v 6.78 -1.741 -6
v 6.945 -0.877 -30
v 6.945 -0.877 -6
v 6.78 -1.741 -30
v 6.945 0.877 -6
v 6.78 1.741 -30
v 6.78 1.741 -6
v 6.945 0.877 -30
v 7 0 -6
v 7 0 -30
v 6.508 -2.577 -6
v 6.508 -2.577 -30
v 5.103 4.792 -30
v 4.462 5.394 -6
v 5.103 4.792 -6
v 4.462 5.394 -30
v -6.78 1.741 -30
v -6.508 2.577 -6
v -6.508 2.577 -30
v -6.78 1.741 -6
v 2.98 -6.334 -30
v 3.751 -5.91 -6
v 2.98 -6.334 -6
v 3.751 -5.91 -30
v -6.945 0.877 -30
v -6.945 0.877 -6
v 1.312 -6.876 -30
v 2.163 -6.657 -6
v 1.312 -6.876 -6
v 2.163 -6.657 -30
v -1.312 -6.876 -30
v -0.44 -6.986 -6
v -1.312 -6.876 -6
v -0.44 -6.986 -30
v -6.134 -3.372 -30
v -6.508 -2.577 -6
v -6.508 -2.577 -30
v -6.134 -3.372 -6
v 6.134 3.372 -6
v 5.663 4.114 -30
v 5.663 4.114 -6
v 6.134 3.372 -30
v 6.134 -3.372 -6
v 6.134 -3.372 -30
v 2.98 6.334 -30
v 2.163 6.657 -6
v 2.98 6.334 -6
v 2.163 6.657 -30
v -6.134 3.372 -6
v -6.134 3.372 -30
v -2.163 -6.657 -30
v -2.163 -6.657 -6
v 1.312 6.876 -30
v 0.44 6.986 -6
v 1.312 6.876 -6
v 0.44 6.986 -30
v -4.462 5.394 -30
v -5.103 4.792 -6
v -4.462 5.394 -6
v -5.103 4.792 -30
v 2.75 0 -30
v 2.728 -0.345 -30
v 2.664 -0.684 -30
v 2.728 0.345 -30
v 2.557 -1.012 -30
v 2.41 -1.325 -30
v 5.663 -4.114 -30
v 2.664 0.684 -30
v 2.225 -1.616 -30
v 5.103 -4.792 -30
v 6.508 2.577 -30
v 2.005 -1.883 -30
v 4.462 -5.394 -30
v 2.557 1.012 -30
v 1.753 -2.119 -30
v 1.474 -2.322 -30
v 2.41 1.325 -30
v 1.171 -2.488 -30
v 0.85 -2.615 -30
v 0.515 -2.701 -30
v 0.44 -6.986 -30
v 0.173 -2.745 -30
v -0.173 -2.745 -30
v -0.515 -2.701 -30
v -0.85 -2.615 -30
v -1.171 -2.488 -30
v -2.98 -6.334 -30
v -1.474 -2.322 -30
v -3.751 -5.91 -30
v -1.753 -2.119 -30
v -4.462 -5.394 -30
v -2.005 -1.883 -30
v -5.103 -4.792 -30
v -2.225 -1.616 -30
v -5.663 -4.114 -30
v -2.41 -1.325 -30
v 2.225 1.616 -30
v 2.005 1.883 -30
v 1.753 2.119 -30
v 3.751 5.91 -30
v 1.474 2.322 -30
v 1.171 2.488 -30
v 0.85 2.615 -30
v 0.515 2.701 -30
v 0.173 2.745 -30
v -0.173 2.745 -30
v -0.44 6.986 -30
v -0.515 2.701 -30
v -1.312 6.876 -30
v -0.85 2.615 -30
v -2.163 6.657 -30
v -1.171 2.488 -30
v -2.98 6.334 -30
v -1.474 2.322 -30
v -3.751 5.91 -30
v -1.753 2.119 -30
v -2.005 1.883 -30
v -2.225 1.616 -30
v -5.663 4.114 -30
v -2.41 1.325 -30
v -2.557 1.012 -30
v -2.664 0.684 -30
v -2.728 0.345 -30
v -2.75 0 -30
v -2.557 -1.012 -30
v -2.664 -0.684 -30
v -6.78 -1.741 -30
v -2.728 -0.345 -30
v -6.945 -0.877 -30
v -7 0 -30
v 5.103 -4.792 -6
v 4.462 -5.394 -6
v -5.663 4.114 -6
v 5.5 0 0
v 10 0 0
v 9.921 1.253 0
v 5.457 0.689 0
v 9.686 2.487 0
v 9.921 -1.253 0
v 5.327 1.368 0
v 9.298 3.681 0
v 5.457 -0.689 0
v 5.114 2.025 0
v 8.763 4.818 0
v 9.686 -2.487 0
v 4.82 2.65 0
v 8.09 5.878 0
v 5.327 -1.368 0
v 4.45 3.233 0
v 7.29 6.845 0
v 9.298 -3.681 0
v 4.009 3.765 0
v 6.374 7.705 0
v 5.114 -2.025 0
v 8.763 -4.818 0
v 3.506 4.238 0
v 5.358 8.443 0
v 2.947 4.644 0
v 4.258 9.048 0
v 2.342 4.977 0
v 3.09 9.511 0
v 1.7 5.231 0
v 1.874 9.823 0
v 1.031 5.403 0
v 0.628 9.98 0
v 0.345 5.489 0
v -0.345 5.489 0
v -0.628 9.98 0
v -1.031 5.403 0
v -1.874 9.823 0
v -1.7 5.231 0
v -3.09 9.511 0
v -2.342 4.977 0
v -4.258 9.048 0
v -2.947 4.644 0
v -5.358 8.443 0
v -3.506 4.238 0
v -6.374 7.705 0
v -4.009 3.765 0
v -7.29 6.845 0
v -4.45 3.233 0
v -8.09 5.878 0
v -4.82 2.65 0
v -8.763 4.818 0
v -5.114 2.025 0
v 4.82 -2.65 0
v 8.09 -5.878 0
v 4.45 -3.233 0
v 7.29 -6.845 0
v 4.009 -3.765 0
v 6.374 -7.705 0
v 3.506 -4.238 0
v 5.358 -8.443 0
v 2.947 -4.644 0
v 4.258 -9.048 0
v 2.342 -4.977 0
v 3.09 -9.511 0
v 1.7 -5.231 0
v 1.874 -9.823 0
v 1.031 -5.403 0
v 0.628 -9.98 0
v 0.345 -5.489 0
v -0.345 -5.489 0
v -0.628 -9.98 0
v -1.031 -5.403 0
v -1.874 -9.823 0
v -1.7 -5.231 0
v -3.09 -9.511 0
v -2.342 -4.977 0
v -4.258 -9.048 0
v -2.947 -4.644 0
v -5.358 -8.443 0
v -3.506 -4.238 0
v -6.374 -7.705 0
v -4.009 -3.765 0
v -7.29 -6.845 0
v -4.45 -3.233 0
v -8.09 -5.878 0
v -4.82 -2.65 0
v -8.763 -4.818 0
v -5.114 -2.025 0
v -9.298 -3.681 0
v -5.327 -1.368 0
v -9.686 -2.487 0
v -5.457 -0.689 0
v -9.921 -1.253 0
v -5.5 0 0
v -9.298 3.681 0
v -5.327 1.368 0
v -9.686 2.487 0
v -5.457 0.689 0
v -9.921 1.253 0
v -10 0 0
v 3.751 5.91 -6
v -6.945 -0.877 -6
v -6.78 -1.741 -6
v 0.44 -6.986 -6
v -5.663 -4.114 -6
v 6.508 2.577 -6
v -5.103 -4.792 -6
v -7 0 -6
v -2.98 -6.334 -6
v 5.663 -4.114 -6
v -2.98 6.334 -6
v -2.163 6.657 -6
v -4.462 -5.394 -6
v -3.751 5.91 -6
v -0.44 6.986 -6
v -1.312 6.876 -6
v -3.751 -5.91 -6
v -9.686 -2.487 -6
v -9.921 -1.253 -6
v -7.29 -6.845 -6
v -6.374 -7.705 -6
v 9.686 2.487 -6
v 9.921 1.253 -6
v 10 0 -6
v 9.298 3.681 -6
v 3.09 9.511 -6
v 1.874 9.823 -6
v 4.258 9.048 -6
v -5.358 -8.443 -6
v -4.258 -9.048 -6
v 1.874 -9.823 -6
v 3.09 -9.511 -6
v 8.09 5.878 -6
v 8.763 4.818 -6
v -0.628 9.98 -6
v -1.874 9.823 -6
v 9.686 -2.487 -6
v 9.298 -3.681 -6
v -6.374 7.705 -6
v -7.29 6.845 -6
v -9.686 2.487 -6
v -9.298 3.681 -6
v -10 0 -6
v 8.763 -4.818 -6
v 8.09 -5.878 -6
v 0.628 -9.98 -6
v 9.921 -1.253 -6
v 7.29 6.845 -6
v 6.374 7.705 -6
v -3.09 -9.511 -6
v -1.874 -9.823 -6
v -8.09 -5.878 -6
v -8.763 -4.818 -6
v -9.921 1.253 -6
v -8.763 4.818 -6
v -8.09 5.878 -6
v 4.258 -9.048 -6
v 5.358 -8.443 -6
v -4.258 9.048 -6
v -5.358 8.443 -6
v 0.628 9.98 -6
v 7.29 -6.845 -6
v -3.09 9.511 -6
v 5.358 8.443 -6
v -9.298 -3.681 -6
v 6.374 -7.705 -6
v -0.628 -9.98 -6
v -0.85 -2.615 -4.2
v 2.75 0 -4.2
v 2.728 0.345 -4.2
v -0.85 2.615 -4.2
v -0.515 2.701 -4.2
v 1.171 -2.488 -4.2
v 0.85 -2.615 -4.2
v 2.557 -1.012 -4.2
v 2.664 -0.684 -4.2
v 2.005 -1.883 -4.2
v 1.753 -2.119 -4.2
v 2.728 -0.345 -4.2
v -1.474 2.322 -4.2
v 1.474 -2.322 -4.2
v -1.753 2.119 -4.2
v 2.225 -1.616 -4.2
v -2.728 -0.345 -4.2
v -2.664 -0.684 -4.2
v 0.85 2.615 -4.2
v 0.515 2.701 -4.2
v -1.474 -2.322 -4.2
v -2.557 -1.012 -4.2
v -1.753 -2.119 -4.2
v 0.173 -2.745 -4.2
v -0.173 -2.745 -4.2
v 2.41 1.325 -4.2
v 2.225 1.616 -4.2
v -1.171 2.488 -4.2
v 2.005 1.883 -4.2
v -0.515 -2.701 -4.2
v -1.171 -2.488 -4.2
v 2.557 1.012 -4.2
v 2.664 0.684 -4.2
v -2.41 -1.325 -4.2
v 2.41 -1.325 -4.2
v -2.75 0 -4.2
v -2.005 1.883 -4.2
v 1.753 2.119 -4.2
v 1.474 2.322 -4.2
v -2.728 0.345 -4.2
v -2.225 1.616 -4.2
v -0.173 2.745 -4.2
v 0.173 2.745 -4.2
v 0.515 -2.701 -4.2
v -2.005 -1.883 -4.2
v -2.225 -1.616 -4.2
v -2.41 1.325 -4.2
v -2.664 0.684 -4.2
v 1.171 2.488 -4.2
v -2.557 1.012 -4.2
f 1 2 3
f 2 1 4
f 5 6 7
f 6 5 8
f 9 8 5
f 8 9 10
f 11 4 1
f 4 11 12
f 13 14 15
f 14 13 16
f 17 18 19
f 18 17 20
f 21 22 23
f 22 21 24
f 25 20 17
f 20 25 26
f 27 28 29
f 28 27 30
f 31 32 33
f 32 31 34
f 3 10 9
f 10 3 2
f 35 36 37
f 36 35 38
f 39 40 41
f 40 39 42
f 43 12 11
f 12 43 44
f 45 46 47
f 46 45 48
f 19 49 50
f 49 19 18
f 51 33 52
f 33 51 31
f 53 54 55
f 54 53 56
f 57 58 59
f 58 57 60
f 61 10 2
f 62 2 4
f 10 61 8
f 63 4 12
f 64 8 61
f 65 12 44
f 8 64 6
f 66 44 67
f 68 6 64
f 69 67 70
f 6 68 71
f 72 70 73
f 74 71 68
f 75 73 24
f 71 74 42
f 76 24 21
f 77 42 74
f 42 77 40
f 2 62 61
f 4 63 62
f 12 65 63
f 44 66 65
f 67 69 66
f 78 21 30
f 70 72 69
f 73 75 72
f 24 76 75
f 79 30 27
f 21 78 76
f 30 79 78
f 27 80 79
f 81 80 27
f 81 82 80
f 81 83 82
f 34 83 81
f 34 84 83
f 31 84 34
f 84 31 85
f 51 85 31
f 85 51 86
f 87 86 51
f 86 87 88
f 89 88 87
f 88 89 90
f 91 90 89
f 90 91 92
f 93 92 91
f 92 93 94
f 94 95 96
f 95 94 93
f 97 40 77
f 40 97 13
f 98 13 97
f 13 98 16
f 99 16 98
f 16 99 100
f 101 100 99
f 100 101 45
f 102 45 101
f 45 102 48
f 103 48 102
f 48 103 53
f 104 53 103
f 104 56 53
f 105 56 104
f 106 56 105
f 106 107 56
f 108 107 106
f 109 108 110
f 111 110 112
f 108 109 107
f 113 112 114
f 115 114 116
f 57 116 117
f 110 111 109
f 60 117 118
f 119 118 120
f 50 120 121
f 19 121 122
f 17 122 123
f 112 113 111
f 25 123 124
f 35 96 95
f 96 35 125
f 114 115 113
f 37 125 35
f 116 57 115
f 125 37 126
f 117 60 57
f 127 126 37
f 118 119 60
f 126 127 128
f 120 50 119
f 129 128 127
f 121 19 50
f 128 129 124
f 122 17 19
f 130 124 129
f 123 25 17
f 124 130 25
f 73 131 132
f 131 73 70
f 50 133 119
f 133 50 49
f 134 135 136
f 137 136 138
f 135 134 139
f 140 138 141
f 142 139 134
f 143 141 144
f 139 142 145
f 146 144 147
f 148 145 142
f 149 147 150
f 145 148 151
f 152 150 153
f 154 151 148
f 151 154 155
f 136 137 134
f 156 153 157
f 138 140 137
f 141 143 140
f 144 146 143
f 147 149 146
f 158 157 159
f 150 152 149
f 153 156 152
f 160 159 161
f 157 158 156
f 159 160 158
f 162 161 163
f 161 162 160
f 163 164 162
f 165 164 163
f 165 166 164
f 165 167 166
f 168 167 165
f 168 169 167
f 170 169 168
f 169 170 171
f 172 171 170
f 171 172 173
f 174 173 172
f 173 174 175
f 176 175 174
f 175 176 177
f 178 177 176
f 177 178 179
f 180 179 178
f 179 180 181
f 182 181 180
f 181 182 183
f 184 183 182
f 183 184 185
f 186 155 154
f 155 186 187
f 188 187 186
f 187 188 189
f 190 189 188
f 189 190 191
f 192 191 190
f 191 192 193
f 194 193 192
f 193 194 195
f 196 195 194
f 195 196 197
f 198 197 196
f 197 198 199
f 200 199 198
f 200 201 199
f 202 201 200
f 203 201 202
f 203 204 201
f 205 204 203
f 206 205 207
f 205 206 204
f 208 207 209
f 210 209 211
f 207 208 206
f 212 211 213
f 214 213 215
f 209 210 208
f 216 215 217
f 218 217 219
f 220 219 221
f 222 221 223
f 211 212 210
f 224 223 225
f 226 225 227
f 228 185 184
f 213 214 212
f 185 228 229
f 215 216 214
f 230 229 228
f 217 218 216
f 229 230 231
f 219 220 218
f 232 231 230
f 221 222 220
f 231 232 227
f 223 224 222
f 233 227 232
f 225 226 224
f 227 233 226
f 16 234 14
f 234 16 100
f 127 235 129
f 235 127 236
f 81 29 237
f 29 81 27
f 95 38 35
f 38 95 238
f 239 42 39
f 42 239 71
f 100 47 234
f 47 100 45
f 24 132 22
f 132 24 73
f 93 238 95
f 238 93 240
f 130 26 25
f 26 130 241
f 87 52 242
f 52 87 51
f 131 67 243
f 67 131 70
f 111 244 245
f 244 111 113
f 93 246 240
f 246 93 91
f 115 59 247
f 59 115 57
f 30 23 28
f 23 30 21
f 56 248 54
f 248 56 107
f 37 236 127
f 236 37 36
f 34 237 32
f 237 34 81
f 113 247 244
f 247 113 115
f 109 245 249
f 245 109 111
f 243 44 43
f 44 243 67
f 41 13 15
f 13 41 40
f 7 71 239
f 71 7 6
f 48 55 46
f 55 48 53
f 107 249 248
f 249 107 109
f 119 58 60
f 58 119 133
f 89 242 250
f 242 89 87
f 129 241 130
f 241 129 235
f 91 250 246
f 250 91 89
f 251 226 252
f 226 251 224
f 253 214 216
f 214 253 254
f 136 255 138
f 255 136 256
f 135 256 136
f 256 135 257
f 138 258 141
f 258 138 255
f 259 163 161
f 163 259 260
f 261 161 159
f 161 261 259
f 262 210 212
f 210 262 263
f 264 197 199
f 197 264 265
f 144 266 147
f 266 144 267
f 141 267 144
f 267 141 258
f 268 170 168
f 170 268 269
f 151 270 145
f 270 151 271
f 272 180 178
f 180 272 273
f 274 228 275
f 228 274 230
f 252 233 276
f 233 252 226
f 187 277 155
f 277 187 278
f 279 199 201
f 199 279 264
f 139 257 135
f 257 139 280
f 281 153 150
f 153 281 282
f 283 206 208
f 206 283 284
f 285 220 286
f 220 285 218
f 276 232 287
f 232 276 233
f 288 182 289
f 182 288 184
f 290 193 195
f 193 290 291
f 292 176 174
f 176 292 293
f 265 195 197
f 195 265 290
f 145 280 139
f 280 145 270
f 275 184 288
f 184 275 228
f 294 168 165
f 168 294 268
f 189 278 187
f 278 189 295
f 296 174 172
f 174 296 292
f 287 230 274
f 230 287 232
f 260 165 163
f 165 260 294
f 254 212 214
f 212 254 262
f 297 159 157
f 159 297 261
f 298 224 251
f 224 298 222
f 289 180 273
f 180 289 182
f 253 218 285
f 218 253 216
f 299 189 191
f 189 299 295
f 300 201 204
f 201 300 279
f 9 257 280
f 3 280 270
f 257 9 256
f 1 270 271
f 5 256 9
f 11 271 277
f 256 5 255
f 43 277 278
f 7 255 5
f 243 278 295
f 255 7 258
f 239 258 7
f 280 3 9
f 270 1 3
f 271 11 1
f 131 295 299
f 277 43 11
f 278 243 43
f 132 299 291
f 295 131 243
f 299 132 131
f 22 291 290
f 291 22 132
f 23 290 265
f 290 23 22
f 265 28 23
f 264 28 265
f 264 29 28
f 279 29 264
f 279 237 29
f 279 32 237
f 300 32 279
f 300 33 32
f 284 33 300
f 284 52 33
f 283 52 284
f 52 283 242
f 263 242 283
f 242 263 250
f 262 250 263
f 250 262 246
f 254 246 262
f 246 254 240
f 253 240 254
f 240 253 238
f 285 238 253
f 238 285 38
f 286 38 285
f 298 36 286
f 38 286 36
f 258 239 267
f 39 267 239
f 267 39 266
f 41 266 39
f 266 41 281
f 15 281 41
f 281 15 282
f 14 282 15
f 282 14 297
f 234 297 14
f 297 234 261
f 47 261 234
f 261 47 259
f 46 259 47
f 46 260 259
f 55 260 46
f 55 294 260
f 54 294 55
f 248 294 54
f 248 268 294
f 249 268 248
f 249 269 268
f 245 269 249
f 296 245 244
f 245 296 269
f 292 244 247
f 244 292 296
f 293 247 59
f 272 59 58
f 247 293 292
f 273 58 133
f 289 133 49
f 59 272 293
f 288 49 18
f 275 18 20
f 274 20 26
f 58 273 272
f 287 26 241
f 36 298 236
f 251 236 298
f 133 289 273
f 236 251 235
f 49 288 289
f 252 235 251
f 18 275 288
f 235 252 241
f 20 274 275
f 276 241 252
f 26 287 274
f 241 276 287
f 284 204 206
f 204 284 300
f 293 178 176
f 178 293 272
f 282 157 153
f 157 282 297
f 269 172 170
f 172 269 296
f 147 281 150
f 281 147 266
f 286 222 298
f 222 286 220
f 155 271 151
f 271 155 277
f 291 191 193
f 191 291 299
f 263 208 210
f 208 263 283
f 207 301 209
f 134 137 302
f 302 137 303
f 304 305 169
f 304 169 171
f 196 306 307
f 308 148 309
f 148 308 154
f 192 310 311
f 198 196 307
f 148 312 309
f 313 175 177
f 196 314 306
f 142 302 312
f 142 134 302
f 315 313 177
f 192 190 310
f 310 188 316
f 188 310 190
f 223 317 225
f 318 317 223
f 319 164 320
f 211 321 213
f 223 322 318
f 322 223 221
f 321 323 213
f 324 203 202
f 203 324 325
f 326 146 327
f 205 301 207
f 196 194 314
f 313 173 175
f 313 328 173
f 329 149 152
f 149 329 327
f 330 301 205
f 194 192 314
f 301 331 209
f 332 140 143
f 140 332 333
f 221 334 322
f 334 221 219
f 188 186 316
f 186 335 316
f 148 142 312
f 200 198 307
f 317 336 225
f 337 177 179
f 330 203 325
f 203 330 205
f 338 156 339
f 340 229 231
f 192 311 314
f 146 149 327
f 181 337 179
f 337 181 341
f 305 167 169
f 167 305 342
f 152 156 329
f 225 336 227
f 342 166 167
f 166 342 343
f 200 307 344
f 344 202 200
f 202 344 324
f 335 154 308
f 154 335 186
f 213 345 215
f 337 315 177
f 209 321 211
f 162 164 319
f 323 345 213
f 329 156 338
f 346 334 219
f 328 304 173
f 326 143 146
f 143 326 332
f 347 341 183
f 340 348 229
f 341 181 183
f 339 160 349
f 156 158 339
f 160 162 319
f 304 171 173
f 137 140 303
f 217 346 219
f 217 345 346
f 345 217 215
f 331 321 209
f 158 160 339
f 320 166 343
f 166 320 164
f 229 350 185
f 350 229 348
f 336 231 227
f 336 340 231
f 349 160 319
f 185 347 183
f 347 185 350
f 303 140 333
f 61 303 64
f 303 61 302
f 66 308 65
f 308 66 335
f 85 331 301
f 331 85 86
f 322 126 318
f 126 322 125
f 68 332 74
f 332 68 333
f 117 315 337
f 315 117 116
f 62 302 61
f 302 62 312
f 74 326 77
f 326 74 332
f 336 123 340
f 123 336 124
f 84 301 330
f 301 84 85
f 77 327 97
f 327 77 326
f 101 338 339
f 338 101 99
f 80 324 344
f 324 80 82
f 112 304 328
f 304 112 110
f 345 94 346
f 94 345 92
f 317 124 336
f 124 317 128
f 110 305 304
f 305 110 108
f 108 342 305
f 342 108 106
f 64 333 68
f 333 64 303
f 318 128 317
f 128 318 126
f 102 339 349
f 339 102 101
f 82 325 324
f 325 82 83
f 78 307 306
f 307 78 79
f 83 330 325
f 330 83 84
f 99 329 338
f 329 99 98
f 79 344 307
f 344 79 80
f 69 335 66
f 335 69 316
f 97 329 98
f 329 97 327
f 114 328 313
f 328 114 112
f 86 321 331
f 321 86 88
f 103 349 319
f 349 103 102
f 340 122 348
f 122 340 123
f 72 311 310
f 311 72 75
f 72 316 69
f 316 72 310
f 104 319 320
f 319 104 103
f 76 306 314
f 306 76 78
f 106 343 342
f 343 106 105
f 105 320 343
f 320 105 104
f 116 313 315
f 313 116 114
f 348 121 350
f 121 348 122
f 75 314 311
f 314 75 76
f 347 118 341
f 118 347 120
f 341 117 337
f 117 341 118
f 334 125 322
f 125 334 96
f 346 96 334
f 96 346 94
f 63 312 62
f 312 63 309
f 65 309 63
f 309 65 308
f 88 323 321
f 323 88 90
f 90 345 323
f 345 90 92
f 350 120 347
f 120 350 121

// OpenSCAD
$fn = 50;


difference() {
	union() {
		translate(v = [0, 0, -30.0000000000]) {
			cylinder(h = 30, r = 7.0000000000);
		}
		translate(v = [0, 0, -6.0000000000]) {
			cylinder(h = 6, r = 10.0000000000);
		}
	}
	union() {
		translate(v = [0, 0, 0]) {
			rotate(a = [0, 0, 0]) {
				difference() {
					union() {
						#translate(v = [0, 0, -30.0000000000]) {
							cylinder(h = 30, r = 2.2500000000);
						}
						#translate(v = [0, 0, -4.2000000000]) {
							cylinder(h = 4.2000000000, r1 = 2.7500000000, r2 = 5.5000000000);
						}
						#translate(v = [0, 0, -30.0000000000]) {
							cylinder(h = 30, r = 2.7500000000);
						}
						#translate(v = [0, 0, -30.0000000000]) {
							cylinder(h = 30, r = 2.2500000000);
						}
					}
					union();
				}
			}
		}
	}
}
